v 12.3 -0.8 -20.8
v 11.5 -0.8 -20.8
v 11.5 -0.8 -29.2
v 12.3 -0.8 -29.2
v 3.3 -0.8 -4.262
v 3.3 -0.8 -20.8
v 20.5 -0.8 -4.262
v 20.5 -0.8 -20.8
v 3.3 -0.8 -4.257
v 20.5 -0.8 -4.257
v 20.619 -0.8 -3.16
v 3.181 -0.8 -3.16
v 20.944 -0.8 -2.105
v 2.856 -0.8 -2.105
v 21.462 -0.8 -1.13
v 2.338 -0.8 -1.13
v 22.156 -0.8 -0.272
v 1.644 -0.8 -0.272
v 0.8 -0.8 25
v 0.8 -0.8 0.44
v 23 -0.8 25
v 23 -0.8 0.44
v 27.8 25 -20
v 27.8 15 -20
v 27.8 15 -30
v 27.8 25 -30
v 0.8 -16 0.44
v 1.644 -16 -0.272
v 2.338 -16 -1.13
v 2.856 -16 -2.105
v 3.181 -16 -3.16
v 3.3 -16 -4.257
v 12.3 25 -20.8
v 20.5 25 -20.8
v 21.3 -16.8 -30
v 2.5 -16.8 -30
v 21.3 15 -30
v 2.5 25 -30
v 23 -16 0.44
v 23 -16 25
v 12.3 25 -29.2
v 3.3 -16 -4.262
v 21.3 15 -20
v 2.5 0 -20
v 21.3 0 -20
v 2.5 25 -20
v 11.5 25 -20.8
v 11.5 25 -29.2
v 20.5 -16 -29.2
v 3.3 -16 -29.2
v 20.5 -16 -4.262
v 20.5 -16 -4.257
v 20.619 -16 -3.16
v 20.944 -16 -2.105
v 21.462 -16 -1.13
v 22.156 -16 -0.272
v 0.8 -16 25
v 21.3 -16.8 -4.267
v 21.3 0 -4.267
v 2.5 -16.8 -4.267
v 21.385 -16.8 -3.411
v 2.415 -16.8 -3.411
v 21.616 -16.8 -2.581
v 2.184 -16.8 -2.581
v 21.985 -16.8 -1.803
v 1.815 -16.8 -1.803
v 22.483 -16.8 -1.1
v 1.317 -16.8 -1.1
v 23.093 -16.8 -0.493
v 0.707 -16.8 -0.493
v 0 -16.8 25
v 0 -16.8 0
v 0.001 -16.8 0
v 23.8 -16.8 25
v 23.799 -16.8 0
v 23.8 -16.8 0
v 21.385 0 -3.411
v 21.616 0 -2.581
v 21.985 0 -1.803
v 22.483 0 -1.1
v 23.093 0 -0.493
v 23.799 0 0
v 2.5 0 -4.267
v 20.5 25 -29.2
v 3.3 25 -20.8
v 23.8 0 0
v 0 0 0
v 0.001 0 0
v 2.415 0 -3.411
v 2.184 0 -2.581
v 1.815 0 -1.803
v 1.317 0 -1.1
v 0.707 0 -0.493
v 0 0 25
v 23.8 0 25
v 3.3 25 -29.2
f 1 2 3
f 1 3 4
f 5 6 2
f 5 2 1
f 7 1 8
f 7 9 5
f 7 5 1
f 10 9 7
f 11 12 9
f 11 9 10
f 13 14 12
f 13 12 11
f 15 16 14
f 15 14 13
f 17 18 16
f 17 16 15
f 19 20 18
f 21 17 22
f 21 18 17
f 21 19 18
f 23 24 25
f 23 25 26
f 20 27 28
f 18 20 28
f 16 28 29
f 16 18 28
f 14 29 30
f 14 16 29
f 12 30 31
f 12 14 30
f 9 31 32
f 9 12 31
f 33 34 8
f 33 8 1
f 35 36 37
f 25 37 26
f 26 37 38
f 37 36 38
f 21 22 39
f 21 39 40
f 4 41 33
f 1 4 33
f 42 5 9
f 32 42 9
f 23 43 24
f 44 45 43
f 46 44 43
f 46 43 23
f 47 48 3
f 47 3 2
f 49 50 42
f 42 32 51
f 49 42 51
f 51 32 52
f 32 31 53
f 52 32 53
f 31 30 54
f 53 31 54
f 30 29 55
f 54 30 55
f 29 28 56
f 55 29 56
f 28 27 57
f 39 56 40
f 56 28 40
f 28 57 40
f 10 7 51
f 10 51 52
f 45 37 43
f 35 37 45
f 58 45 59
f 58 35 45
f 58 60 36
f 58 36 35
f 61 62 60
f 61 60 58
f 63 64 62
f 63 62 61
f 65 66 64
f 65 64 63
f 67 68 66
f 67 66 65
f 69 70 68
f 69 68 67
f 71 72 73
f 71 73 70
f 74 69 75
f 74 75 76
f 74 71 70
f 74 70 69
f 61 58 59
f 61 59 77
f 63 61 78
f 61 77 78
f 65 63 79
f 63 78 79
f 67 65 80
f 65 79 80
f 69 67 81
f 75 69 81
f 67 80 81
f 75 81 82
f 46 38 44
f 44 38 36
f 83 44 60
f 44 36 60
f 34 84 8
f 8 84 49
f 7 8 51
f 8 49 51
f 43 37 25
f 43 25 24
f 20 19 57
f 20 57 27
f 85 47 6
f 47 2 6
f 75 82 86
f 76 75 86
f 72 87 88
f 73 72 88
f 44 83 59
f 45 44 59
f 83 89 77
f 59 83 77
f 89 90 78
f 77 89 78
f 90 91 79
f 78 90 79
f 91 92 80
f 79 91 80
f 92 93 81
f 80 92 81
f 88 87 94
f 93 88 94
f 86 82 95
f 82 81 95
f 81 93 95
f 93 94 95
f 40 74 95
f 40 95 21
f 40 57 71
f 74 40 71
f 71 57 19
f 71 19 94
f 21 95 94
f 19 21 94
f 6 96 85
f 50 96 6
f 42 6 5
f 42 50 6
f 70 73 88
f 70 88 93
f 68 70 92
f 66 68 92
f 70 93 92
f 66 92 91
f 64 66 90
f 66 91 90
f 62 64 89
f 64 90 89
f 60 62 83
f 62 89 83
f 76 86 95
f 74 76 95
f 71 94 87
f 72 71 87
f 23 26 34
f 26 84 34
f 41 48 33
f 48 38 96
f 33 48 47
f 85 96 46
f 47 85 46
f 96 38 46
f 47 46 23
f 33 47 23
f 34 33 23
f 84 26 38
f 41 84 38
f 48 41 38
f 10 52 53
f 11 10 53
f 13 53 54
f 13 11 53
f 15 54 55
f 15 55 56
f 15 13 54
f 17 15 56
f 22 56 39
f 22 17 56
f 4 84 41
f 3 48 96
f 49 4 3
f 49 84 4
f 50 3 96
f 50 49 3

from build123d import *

# Parameters (mm, degrees)
F2_W        = 18.8
F2_H        = 30
F3_DEPTH    = 16.8
F4_T1_DEPTH = 16.8
F5_T        = 0.8
F5_T3_DEPTH = 18.4
F6_W        = 18.8
F6_H        = 10
F7_DEPTH    = 25
F8_T        = -0.8
F9_DEPTH    = 0.8
F10_W       = 0.8
F10_H       = 8.4
F11_DEPTH   = 25.8
F12_W       = 10
F12_H       = 10
F13_DEPTH   = 6.5


# Not quite as in the source:
# - a fillet or chamfer that OpenCascade refuses, or shapes differently, is made with other operations: its cross-section is extruded or revolved along the edge and cut away or added
# - a shell that OpenCascade refuses in one call is made with other operations: the cavity is built on its own and cut out


with BuildPart() as f3:
    # F2 (on Front) → F3 (new body)
    with BuildSketch(Plane.XZ):
        Polygon((23.8, 25), (0, 25), (0, 0), (2.5, 0), (21.3, 0), (23.8, 0), align=None)
        with Locations((11.9, -15)):
            Rectangle(F2_W, F2_H)
    extrude(amount=F3_DEPTH)

    # F4: fillet of radius 5 on 2 edges, made by hand

    # F4_s2 → F4_t1 (join)
    with BuildSketch(Plane.XZ):
        with BuildLine():
            ThreePointArc((0.0002000386, 0.0003463879), (1.8304834454, -1.8302431314), (2.5004, -4.3306845218))
            Line((2.5004, -4.3306845218), (3.0005365685, -4.3306845218))
            ThreePointArc((3.0005365685, -4.3306845218), (3.0001365685, -2.1653422609), (3.0001365685, 0))
            Line((3.0001365685, 0), (2.5, 0.5001365685))
            ThreePointArc((2.5, 0.5001365685), (1.2501000193, 0.5001365685), (0.250316611, 0.4334494788))
            Line((0.250316611, 0.4334494788), (0.0002000386, 0.0003463879))
        make_face()
        with BuildLine():
            ThreePointArc((21.2996, -4.3306845218), (21.9695165546, -1.8302431314), (23.7997999614, 0.0003463879))
            Line((23.7997999614, 0.0003463879), (23.549683389, 0.4334494788))
            ThreePointArc((23.549683389, 0.4334494788), (22.5498999807, 0.5001365685), (21.3, 0.5001365685))
            Line((21.3, 0.5001365685), (20.7998634315, 0))
            ThreePointArc((20.7998634315, 0), (20.7998634315, -2.1653422609), (20.7994634315, -4.3306845218))
            Line((20.7994634315, -4.3306845218), (21.2996, -4.3306845218))
        make_face()
    extrude(amount=F4_T1_DEPTH)

    # F5: shell of thickness 0.8, made by hand


with BuildPart() as f5_core1:
    # F5_t2: copy of F3
    add(f3.part)

    # the walls: a layer under each face that stays
    f5_faces = [f5_core1.faces().sort_by_distance(p)[0] for p in [
        (23.8, -8.4, 12.5),
        (0, -8.4, 12.5),
        (11.9, 0, -2.5),
        (11.9, -16.8, -2.5),
        (23.7996001251, -8.4, 0),
        (0.0003998749, -8.4, 0),
        (21.3, -8.4, -17.1337157982),
        (11.9, -8.4, -30),
        (2.5, -8.4, -17.1337157982),
        (21.9852401758, -8.4, -1.8032011796),
        (1.8147598242, -8.4, -1.8032011796),
    ]]
    thicken(f5_faces, amount=-F5_T, mode=Mode.SUBTRACT)

    # F5_s4 → F5_t3 (cut)
    with BuildSketch(Plane.XZ.offset(-0.8)):
        Polygon((23.803201982, -0.0149272032), (23.7992002503, 0.8), (23.5847337286, 0.8), (23.3990270828, 0.6927203159), align=None)
        Polygon((-0.003201982, -0.0149272032), (0.0007997497, 0.8), (0.2152662714, 0.8), (0.4009729172, 0.6927203159), align=None)
        Polygon((21.3159993602, -4.2675327735), (20.5, -4.2674315965), (20.5, -4.2623725419), (20.5000639825, -4.257313892), align=None)
        Polygon((2.4840006398, -4.2675327735), (3.3, -4.2674315965), (3.3, -4.2623725419), (3.2999360175, -4.257313892), align=None)
    extrude(amount=F5_T3_DEPTH, mode=Mode.SUBTRACT)


with BuildPart() as f3_1:
    add(f3.part)

    # what is left inside the walls is the cavity
    f5_cavity = [f5_core1.part.solids().sort_by_distance(p)[0] for p in [
        (11.9, -15.992, -11.133333),
    ]]
    add(f5_cavity, mode=Mode.SUBTRACT)

    # F6 (on face) → F7 (join)
    with BuildSketch(Plane(origin=(0, 0, 0), x_dir=(-1, 0, 0), z_dir=(0, 1, 0))):
        with Locations((-11.9, -25)):
            Rectangle(F6_W, F6_H)
    extrude(amount=F7_DEPTH)

    # F8
    f8_openings = [f3_1.faces().sort_by_distance(p)[0] for p in [
        (11.9, 25, -25),
    ]]
    offset(amount=F8_T, openings=f8_openings, kind=Kind.INTERSECTION)

    # F9 (cut, through all): a face of the model
    f9_faces = [f3_1.faces().sort_by_distance(p)[0] for p in [
        (11.9, 0, -25),
    ]]
    extrude(f9_faces, amount=-F9_DEPTH, mode=Mode.SUBTRACT)

    # F10 (on face) → F11 (join, through all)
    with BuildSketch(Plane(origin=(0, 25, 0), x_dir=(-1, 0, 0), z_dir=(0, 1, 0))):
        with Locations((-11.9, -25)):
            Rectangle(F10_W, F10_H)
    extrude(amount=-F11_DEPTH)

    # F12 (on face) → F13 (join)
    with BuildSketch(Plane.YZ.offset(21.3)):
        with Locations((20, -25)):
            Rectangle(F12_W, F12_H)
    extrude(amount=F13_DEPTH)


solid = f3_1.part
